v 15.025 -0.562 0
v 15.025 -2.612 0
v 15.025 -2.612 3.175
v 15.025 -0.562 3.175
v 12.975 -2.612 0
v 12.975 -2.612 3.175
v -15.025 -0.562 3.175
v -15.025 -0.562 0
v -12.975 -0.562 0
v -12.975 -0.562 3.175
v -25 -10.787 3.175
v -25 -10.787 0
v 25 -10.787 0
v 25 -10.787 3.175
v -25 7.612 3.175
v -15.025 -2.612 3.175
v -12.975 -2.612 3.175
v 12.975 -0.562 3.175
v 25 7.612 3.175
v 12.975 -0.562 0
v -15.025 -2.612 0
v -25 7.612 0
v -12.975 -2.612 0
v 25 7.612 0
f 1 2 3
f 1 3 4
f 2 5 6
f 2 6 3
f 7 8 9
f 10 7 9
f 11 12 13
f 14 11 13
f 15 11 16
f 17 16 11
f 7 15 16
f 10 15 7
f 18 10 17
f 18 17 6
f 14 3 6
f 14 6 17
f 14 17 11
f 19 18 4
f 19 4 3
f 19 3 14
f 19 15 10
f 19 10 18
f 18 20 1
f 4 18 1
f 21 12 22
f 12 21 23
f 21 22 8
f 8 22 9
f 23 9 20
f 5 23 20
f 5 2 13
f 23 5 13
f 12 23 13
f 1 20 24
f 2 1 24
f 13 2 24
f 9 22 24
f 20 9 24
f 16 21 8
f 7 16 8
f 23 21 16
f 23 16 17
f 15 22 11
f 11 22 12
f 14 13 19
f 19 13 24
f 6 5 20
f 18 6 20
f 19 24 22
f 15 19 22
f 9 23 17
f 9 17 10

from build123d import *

# Parameters (mm, degrees)
SKETCH2_W           = 2.05
SKETCH2_H           = 2.05
BOSS_EXTRUDE1_DEPTH = 3.175


with BuildPart() as part:
    # Sketch2 → Boss-Extrude1 (new body)
    with BuildSketch(Plane.XY):
        Polygon((-25, -10.7874943), (25, -10.7874943), (25, -1), (25, 1), (25, 7.6124943), (22.5, 7.6124943), (20.5, 7.6124943), (18, 7.6124943), (-18, 7.6124943), (-20.5, 7.6124943), (-22.5, 7.6124943), (-25, 7.6124943), (-25, 1), (-25, -1), align=None)
        with Locations((-14, -1.5874943)):
            Rectangle(SKETCH2_W, SKETCH2_H, mode=Mode.SUBTRACT)
        with Locations((14, -1.5874943)):
            Rectangle(SKETCH2_W, SKETCH2_H, mode=Mode.SUBTRACT)
    extrude(amount=BOSS_EXTRUDE1_DEPTH)


solid = part.part
